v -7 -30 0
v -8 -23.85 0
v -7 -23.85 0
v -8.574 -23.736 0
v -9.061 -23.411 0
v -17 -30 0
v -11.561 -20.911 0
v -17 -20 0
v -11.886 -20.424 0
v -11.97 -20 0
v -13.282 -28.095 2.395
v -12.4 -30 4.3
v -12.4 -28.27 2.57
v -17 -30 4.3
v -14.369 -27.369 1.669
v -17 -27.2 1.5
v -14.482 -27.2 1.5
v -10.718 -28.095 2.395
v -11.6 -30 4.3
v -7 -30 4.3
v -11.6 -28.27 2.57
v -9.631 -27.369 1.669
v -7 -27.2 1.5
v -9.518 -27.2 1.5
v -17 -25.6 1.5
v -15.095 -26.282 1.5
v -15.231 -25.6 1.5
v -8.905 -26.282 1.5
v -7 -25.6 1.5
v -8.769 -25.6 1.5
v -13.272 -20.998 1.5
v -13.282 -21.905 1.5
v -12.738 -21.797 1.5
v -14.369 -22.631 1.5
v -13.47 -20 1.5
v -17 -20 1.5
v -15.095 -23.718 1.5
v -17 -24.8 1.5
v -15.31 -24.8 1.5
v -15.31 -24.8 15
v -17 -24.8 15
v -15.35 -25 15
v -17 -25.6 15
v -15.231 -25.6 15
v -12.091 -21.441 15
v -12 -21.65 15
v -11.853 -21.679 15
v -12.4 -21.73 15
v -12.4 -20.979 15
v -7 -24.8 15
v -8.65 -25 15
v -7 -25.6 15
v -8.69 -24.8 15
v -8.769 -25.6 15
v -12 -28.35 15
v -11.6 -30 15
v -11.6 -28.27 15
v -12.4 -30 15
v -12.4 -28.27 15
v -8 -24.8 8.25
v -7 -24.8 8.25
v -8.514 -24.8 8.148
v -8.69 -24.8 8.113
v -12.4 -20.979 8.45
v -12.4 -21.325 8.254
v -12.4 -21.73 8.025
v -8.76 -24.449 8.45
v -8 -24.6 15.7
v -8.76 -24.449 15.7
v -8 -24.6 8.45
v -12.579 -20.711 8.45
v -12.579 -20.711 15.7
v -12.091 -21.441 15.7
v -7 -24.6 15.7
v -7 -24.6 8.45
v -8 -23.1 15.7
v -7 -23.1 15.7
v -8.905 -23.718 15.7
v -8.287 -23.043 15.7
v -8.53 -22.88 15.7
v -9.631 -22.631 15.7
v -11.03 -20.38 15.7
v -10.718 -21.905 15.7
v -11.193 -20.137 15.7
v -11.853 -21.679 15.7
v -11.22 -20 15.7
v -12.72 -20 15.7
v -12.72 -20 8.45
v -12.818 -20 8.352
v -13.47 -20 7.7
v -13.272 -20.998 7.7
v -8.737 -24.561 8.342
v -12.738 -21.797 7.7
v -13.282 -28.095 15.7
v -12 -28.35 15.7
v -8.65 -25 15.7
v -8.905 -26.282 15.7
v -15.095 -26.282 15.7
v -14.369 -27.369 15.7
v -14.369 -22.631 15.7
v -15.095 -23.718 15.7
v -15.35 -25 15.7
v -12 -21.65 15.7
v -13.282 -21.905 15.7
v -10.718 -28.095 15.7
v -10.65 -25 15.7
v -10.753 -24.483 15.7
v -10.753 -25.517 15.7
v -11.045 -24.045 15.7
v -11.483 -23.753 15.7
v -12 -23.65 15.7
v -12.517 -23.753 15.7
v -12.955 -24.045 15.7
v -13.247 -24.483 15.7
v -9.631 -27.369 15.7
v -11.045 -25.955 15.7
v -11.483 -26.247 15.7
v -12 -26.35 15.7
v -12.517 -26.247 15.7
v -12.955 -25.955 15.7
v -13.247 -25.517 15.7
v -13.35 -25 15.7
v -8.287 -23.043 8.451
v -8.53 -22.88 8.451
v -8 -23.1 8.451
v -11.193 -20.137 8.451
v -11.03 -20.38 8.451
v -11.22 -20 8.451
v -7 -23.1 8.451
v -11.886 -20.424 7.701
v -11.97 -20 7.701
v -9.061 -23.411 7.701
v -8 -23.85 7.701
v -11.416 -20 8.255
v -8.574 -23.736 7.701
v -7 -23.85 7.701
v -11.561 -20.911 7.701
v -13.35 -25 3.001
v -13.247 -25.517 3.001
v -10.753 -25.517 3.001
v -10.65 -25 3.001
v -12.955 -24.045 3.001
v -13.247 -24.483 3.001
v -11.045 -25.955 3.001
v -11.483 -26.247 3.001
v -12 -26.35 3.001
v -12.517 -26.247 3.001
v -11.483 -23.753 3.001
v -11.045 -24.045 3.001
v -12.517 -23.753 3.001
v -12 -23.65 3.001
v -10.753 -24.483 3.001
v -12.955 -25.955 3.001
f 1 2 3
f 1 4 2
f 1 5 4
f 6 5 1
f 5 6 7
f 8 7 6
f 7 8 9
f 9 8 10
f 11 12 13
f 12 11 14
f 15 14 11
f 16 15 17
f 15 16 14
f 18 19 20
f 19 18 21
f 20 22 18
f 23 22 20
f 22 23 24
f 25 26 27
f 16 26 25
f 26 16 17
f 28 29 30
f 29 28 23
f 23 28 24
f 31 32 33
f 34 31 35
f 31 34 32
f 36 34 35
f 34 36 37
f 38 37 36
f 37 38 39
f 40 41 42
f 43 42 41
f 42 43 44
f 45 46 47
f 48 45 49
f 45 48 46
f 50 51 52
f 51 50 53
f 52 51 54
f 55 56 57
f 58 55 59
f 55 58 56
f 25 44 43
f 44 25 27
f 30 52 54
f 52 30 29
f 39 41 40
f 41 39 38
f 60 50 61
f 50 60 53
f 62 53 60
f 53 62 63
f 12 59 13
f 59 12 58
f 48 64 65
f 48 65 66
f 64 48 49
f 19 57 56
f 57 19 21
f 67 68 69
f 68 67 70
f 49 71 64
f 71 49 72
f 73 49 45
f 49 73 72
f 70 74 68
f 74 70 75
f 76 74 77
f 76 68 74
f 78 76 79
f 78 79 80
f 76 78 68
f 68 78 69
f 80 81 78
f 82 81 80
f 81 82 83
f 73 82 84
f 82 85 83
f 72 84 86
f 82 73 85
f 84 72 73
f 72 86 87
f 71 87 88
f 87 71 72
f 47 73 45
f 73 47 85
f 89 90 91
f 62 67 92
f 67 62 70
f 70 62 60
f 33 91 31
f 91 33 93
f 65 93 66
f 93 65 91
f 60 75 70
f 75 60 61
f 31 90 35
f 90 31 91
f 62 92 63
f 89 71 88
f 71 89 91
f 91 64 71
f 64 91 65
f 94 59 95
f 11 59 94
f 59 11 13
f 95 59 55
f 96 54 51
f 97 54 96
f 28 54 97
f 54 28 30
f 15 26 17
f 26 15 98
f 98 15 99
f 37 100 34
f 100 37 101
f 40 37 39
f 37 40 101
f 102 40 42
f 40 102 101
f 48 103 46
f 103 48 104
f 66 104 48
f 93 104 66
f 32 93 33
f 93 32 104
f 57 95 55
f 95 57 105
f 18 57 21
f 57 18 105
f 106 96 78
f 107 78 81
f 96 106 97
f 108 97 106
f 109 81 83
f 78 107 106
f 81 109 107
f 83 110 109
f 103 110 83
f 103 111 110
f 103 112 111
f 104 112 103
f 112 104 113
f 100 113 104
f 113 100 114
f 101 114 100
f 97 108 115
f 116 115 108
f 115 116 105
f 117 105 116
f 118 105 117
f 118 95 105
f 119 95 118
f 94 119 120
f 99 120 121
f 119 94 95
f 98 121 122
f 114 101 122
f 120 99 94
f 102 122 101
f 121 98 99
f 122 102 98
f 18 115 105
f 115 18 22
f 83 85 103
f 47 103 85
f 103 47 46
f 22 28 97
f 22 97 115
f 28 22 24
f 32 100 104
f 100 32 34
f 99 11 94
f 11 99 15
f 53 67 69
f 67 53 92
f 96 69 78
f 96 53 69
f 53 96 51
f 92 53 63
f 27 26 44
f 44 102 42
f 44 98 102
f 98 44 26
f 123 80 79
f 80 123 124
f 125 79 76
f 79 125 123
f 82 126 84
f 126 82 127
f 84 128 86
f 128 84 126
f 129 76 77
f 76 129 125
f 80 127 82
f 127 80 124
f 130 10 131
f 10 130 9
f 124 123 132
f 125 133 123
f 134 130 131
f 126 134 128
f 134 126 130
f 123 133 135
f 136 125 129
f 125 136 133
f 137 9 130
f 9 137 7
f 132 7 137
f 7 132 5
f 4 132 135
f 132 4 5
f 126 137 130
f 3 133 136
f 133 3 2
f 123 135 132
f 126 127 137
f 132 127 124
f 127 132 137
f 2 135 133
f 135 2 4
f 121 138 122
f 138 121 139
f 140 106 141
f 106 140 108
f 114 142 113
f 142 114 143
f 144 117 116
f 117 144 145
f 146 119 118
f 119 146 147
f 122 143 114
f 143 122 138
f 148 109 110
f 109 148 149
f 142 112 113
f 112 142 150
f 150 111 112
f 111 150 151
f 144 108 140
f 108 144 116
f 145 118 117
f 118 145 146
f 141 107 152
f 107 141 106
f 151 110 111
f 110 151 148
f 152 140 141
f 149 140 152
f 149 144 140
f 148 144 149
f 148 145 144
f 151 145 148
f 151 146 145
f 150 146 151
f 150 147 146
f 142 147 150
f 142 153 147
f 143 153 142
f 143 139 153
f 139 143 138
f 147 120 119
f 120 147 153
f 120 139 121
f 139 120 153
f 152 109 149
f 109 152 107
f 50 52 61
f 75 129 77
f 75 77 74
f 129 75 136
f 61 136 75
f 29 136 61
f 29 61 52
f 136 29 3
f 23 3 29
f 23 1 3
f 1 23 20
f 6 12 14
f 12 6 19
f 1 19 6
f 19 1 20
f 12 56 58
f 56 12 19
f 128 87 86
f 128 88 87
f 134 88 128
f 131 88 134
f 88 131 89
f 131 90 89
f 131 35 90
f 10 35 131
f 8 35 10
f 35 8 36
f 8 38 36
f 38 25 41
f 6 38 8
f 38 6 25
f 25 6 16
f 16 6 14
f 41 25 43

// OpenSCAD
// file: params.scad
depth=40;

xt60_loc = [ [-47,-depth, 15], [-27,-depth, 15], [-7,-depth, 15] ];
plug_loc = [5,-depth, 1.5];

margin = 0.2;

plug_margin=0.2;

xt60_margin = 0.25;
xt60m_margin = 1;

xt60_thickness = 1.5;
plug_thickness = 2;

case_w_inner = 115+2*margin;
case_h_inner = 30+2*margin;
case_thickness = 3;
case_front_thickness = 1.5;
case_w = case_w_inner + 2*case_thickness;
case_d = depth + 40;
case_h = case_h_inner + 2*case_thickness;

case_dim = [case_w, case_d, case_h];
case_dim_inner = [case_w_inner, case_d, case_h_inner];
case_dim_inside = [(case_w_inner+case_w)/2, case_d, (case_h_inner+case_h)/2];

bump_corner=(case_thickness+margin)*2.5;

front = [0,-1, 0];
bottom_front = [0,-1,-1];

grid_rows = 3;
grid_cols = 11;
grid_pitch = 10;
grid_thickness = .8;
grid_depth=12;
grid_xoff =-2;

screw_thread=3;
screw_hole_r=(screw_thread*.9)/2;
screw_hole_border=2;

mw_lrs_gap_d = 18.5;
// file: xt.scad
e=.001;
$fn=16;

xt60_w=15.7;
xt60_h=8;
xt60f_d = 15.7;
xt60f_base_d = 8;
xt60_combined_d=24.1;
xt60_pitch=7;
xt60_chamfer=2.5;
xt60f_pin_d=5.7;
xt60m_pin_d=4.7;
xt60_pin_w=4.5;
xt60_hole_w=4.5;
xt60_corner=.5;

module xt_pins(width, height, pitch)
{
	for (p=[-pitch/2, pitch/2])
	translate([p,0,0])
	cylinder(h=height, r=width/2);
}

module xt_base(w, h, d, chamfer, corner, margin=0, e=0)
{
	w = w-2*corner;
	h = h-2*corner;
	r = corner+margin;
	translate([0,0,-e])
    linear_extrude(d+2*e)
	hull()
    for (p=[ [w/2,-h/2],
	         [-w/2+chamfer, -h/2],
	         [-w/2, -h/2+chamfer],
	         [-w/2, h/2-chamfer],
	         [-w/2+chamfer, h/2],
	         [w/2, h/2]
	])
	translate(p)
	circle(r);
}

module xt60_combined_shell_cutout(margin=0,f_margin=-1,m_margin=-1, e=0)
{
	b=1; 
	xt_base(xt60_w, xt60_h, xt60_combined_d, xt60_chamfer, xt60_corner, margin, e);
	if (f_margin > margin)
	hull()
	{
		xt_base(xt60_w, xt60_h, xt60f_base_d, xt60_chamfer, xt60_corner, f_margin, e);
		translate([0,0,xt60f_base_d])
		xt_base(xt60_w, xt60_h, f_margin-margin, xt60_chamfer, xt60_corner, margin, e);
	}
	if (m_margin > margin)
	hull()
	{
		translate([0,0,xt60f_base_d-(m_margin-margin)])
		xt_base(xt60_w, xt60_h, m_margin-margin, xt60_chamfer, xt60_corner, margin, e);
		translate([0,0,xt60f_base_d])
		xt_base(xt60_w, xt60_h, xt60_combined_d-xt60f_base_d, xt60_chamfer, xt60_corner, m_margin, e);
	}
}


module xt60_combined_cutout(margin=0,f_margin=-1,m_margin=-1, e=0)
{
	b=1; 
	xt60_combined_shell_cutout(margin,f_margin,m_margin, e);

	translate([0, 0, -xt60f_pin_d-margin])
	xt_pins(xt60_pin_w+margin*2, xt60f_pin_d+b+margin, xt60_pitch);

	translate([0, 0, xt60_combined_d-b])
	xt_pins(xt60_pin_w+margin*2, xt60m_pin_d+b+margin, xt60_pitch);
}

module xt60f_cutout(margin=0,f_margin=-1,m_margin=-1,e=0)
{
	translate([0,0,-xt60f_d])
	xt60_combined_cutout(margin,f_margin,m_margin,e);
}

module xt60f_shell_cutout(margin=0,f_margin=-1,m_margin=-1,e=0)
{
	translate([0,0,-xt60f_d])
	xt60_combined_shell_cutout(margin,f_margin,m_margin,e);
}

module xt60f()
{
	b=1;
	translate([0,0,-xt60f_d])
	{
		xt_base(xt60_w, xt60_h, xt60f_base_d, xt60_chamfer, xt60_corner, 0, e);

		translate([0,0,b])
		difference()
		{
			xt_base(xt60_w-2*xt60_corner, xt60_h-2*xt60_corner, xt60f_d-b, xt60_chamfer, xt60_corner, 0, e);
			xt_pins(xt60_hole_w, xt60f_d, xt60_pitch);

		}

		difference()
		{
			translate([0, 0, -xt60f_pin_d])
			xt_pins(xt60_pin_w, xt60f_pin_d+b, xt60_pitch);

			translate([0, 0, -xt60f_pin_d-b])
			xt_pins(xt60_pin_w*.8, xt60f_pin_d+b, xt60_pitch);
		}
	}
}

xt60f();
%xt60f_cutout(margin=.4,m_margin=1,e=e);
// file: power_shield.scad
use <utils.scad>
use <grid.scad>

use <mw_lrs.scad>
use <powerplug.scad>
use <xt.scad>

$fn=16;
e=.001;


margin=.15;
shield_thickness=1.;
shield_bottom=.6;

border_w=51;
border_h=31.2;
border_d=3.5;

w=47;
h=26.8;
d=22;
chamf=4;

corner=1;

module plug_keepout(margin=0, depth=39, e=0)
{
	$fn=16;

	d = .1+e;
	border_w = border_w-2*corner;
	border_h = border_h-2*corner;
	w = w-2*corner;
	h = h-2*corner;
	r = corner+margin;
	off = 16.5;

	color([.3,.3,.3])
	translate([corner,depth-.1,corner])
	rotate([90,0,0])
	{
		translate([(border_w-w)/2,0,-d])
		linear_extrude(d+e)
		hull()
		for (p=[ [off, 0],
		         [off, h],
		         [w-chamf, h],
		         [w, h-chamf],
		         [w, chamf],
		         [w- chamf, 0],
		])
		translate(p)
		circle(r);
	}
}

module plug_hull(margin, d, e=0)
{
	hull()
	{
		difference()
		{
		plug(margin=margin, extra_depth=5+shield_bottom);
		translate([-10,-10,-10])
		cube([100, 30, 100]);
		}
		plug_keepout(margin=margin, depth=d, e=0);
	}
	plug_keepout(margin=margin, depth=d, e=e);
	
}

inner_w=.8;

module power_shield()
{
color("red")
	union()
	{
	difference()
	{
		union()
		{
			plug_hull(margin=margin+shield_thickness, d=39);
		}
		union()
		{
		plug_hull(margin=margin, d=38, e=2);
		}
	}

	intersection()
	{
		plug_hull(margin=margin+shield_thickness/2, d=38.5, e=2);
		difference()
		{
			union()
			{
				translate([(border_w-w)/2+8.5-inner_w/2, 22, h/2-4-inner_w/2])
				cube([inner_w, 20, 20]);

				translate([(border_w-w)/2+8.5, 22, h/2-4-inner_w/2])
				cube([9., 17, inner_w]);

				translate([(border_w-w)/2+17.5-inner_w/2, 22, h/2-4-inner_w/2])
				cube([inner_w, 17, 10]);

				translate([(border_w-w)/2+15-inner_w/2, 38.4, h/2-4-inner_w/2])
				cube([2.5, shield_bottom, 10]);

				for (y=[0,h])
				for (x=[0,w-2])
				translate([(border_w-w)/2+x-5/sqrt(2)-inner_w/2, 22, y])
				rotate([0,45,0])
				cube([5,1,5]);

			}
			translate([(border_w-w)/2+6.5-inner_w/2, 21, h/2-6/2-inner_w/2])
			cube([5, 2, 5.5]);
		}
	}
}
}

rotate([-90,0,0])
translate([0,-39,0])
{
	power_shield();

	//preview()
	//plug();
}
// file: powerplug.scad
e=0.001;

border_w=51;
border_h=31.2;
border_d=3.5;

w=47;
h=26.8;
d=22;
chamf=4;

corner=1;

module plug(margin=0, extra_depth=0)
{
	$fn=16;

	d = d+extra_depth;
	border_w = border_w-2*corner;
	border_h = border_h-2*corner;
	w = w-2*corner;
	h = h-2*corner;
	r = corner+margin;

	color([.3,.3,.3])
	translate([corner,0,corner])
	rotate([90,0,0])
	{
		translate([0,(h-border_h)/2,0])
		linear_extrude(border_d+margin)
		hull()
		for(p=[ [0, 0],
		        [0, border_h],
		        [border_w, border_h],
		        [border_w, 0]
		])
		translate(p)
		circle(r);

		translate([(border_w-w)/2,0,-d])
		linear_extrude(d+e)
		hull()
		for (p=[ [0, 0],
		         [0, h],
		         [w-chamf, h],
		         [w, h-chamf],
		         [w, chamf],
		         [w- chamf, 0],
		])
		translate(p)
		circle(r);
	}
}

module plug_latch(margin=0)
{
	rotate([90,0,0])
	rotate([0,90,0])
	linear_extrude(9)
	{
		polygon([ [0, -1], [0, 1+margin], [9, margin]]);
	}
}

module plug_latches(margin=0)
{
	for (x=[9.5,32])
	for (y_flip=[-1, 1])
	translate([(border_w-w)/2+x,1.6, h/2])
	scale([1,1,y_flip])
	translate([0,0,h/2])
	plug_latch(margin);
}


module plug_latches_keepout(margin=0, extra_depth=0)
{
	for (x=[9.5,32])
	for (y_flip=[-1, 1])
	translate([(border_w-w)/2+x,1.6, h/2])
	scale([1,1,y_flip])
	translate([0,0,h/2])
	cube([9,d+extra_depth-1.6+e,1+margin]);
}

plug();

plug_latches();

#plug_latches_keepout();

%plug(margin=.3);
// file: mw_lrs.scad
e=.001;
$fn=16;

mw_lrs_w=115;
mw_lrs_h=30;
mw_lrs_d=215;


mw_lrs_holes_pitch_d  = 150;
mw_lrs_holes_pitch_w  = 50;
mw_lrs_holes_height_h = 12.5;

mw_lrs_gap_h = 23;
mw_lrs_gap_d = 18.5;

mw_lrs_case_thickness = 1.6;

m4_thread = 4;

mw_lrs_screw_terminal_x=8.5;
mw_lrs_screw_terminal_w=88;
mw_lrs_screw_terminal_d=15;
mw_lrs_screw_terminal_h=15;
mw_lrs_screw_terminal_pitch = 9.5;
mw_lrs_screw_terminal_gap_w = 8;
mw_lrs_screw_terminal_gap_d = 14;
mw_lrs_screw_terminal_gap_z = 7;
mw_lrs_screw_terminal_gap_h = 6;

module mw_lrs_side_holes()
{
	translate( [0, 0, mw_lrs_holes_height_h] )
	for( r = [ 0, 180 ] )
	rotate( [0, r, 0] )
	for( y = [ (mw_lrs_d-mw_lrs_holes_pitch_d)/2, (mw_lrs_d+mw_lrs_holes_pitch_d)/2 ] )
	translate( [-mw_lrs_w/2, y, 0] )
	rotate( [0, 90, 0] )
	children();
}

module mw_lrs_bottom_holes()
{
	for( x = [ -mw_lrs_holes_pitch_w/2, mw_lrs_holes_pitch_w/2 ] )
	for( y = [ (mw_lrs_d-mw_lrs_holes_pitch_d)/2, (mw_lrs_d+mw_lrs_holes_pitch_d)/2 ] )
	translate( [x, y, 0] )
	children();
}

module mw_lrs_holes()
{
	mw_lrs_side_holes() children();
	mw_lrs_bottom_holes() children();
}

module mw_lrs_screw_terminal()
{
	colors = [
		"red", "red", "red",
		"black", "black", "black",
		"green", "blue", "brown",
	];
	b=1;
	translate([mw_lrs_screw_terminal_x, mw_lrs_case_thickness, mw_lrs_h-mw_lrs_gap_h-e])
	{
		difference()
		{
			translate([-mw_lrs_screw_terminal_w/2, 0, 0])
			cube([mw_lrs_screw_terminal_w, mw_lrs_screw_terminal_d, mw_lrs_screw_terminal_h+e]);
			for (i=[0:8])
			translate([(i-4)*9.5-mw_lrs_screw_terminal_gap_w/2, -b, mw_lrs_screw_terminal_gap_z])
			cube([mw_lrs_screw_terminal_gap_w, mw_lrs_screw_terminal_gap_d+b, mw_lrs_screw_terminal_gap_h]);
		}

		for (i=[0:8])
		translate([(i-4)*9.5-mw_lrs_screw_terminal_gap_w/2, -0, mw_lrs_screw_terminal_h])
		color(colors[i])
		cube([mw_lrs_screw_terminal_gap_w,mw_lrs_screw_terminal_gap_d,.1]);

	}
}

module mw_lrs_vents()
{
	b=1;
	hole=4;
	for (y = [36, 44, 52])
	for (i = [-1, 1])
	hull()
	{
		translate([i*(19/2+hole/2), y, mw_lrs_h-mw_lrs_case_thickness-b])
			cylinder(mw_lrs_case_thickness+2*b, r=hole/2);

		translate([i*(19/2+hole/2+33), y, mw_lrs_h-mw_lrs_case_thickness-b])
			cylinder(mw_lrs_case_thickness+2*b, r=hole/2);
	}

	translate([-mw_lrs_w/2+36.7, mw_lrs_d-47.45,mw_lrs_h-mw_lrs_case_thickness-b])
		cylinder(mw_lrs_case_thickness+2*b, r=50/2);
}

module mw_lrs_vents_keepout(h, margin=0)
{
	b=1;
	hole=4;
	hull()
	for (y = [36, 44, 52])
	for (i = [-1, 1])
	{
		translate([i*(19/2+hole/2), y, mw_lrs_h-b])
			cylinder(h+b, r=hole/2+margin);

		translate([i*(19/2+hole/2+33), y, mw_lrs_h-b])
			cylinder(h+b, r=hole/2+margin);
	}

	translate([-mw_lrs_w/2+36.7, mw_lrs_d-47.45,mw_lrs_h-b])
		cylinder(h+b, r=50/2);
}

module mw_lrs()
{
	b=1; 

	union()
	{
		color([.75,.75,.75])
		difference()
		{

			translate([-mw_lrs_w/2,0,0])
			cube([mw_lrs_w, mw_lrs_d, mw_lrs_h]);

			union()
			{
				translate([-mw_lrs_w/2+mw_lrs_case_thickness, -b, mw_lrs_h-mw_lrs_gap_h] )
				cube( [ mw_lrs_w-2*mw_lrs_case_thickness, b+mw_lrs_gap_d, mw_lrs_gap_h+b] );

				translate([-mw_lrs_w/2+mw_lrs_case_thickness, mw_lrs_gap_d-e, mw_lrs_h-mw_lrs_gap_h] )
				cube( [ mw_lrs_w-2*mw_lrs_case_thickness, mw_lrs_d-mw_lrs_gap_d+e-mw_lrs_case_thickness, mw_lrs_gap_h-mw_lrs_case_thickness] );

				mw_lrs_vents();

				mw_lrs_holes()
				{
					translate([0,0,-e])
					cylinder(h=5+e, r=m4_thread/2);
				}
			}
		}
		color([.1, .3, .1])
		translate([-mw_lrs_w/2+mw_lrs_case_thickness, 0, mw_lrs_h-mw_lrs_gap_h-e])
		cube([mw_lrs_w-2*mw_lrs_case_thickness, mw_lrs_d-mw_lrs_case_thickness, e+.1]);
		mw_lrs_screw_terminal();
	}
}

module mw_lrs_keepout(margin=0, e=0)
{
	b=1; 

	w=mw_lrs_w+margin*2;
	d=mw_lrs_d+margin*2;
	h=mw_lrs_h+margin*2;

	translate([-w/2,-margin,-margin])
	cube([w, d, h]);
}

mw_lrs();
%mw_lrs_keepout(margin=.4);

module m4_hole(h, margin=0)
{
	translate([0,0,-h])
	cylinder(h=h+e, r=(m4_thread+margin)/2);
}

%mw_lrs_holes()
m4_hole(10);
// file: grid.scad
module bars(width, height, n, pitch, bar_width, off)
{
	for (i=[0:n-1])
		translate([0, (i-(n-1)/2)*pitch-bar_width/2+off, 0])
			cube([width, bar_width, height]);
}

module grid(width, depth, height, n_rows, n_cols, pitch=10, x_pitch=-1, y_pitch=-1, bar_width=1, x_bar_width=-1, y_bar_width=-1, x_off=0, y_off=0)
{
	x_pitch = x_pitch > 0 ? x_pitch : pitch;
	y_pitch = y_pitch > 0 ? y_pitch : pitch;
	x_bar_width = x_bar_width > 0 ? x_bar_width : bar_width;
	y_bar_width = y_bar_width > 0 ? y_bar_width : bar_width;

	translate( [0, depth/2, 0] )
		bars( width, height, n_rows, y_pitch, y_bar_width, y_off );
	translate( [width/2, 0, 0] )
		rotate([0,0,90])
			bars( depth, height, n_cols, x_pitch, x_bar_width, -x_off) ;
}

grid(100, 50, 1, 4, 8);
// file: utils.scad
module xz_toward_y()
{
	scale([1, 1, -1])
	rotate([-90,0,0])
	children();
}

module anchor(dim, anchor=[0,0,0])
{
	translate([-(1+anchor.x)*dim.x/2, -(1+anchor.y)*dim.y/2, -(1+anchor.z)*dim.z/2])
	children();
}

module block(dim, anchor=[0,0,0])
{
	anchor(dim, anchor)
	cube(dim);
}

module rounded_block_y(dim, anchor=[0,0,0], r=0)
{
	anchor(dim, anchor)
	xz_toward_y()
	linear_extrude(dim.y)
	hull()
	for (p=[ [r,r], [dim.x-r, r], [dim.x-r, dim.z-r], [r, dim.z-r] ] )
	translate(p)
	circle(r);
}

module chamfer_block_y(dim, anchor=[0,0,0], r=0)
{
	anchor(dim, anchor)
	hull()
	{
		translate([r,0,0])
		cube([dim.x-r*2, dim.y, dim.z]);

		translate([0,0,r])
		cube([dim.x, dim.y, dim.z-r*2]);
	}
}

module chamfer_block(dim, anchor=[0,0,0], r=0)
{
	anchor(dim, anchor)
	hull()
	{
		translate([r,r,0])
		cube([dim.x-r*2, dim.y-r*2, dim.z]);

		translate([r,0,r])
		cube([dim.x-r*2, dim.y, dim.z-r*2]);

		translate([0,r,r])
		cube([dim.x, dim.y-r*2, dim.z-r*2]);
	}
}

module preview()
{
	if ($preview)
	children();
}
// file: cover.scad
use <utils.scad>
use <grid.scad>

use <mw_lrs.scad>
use <powerplug.scad>
use <power_shield.scad>
use <xt.scad>

include <params.scad>

$fn=16;
e=.001;

module cutout()
{
	mw_lrs_keepout(margin=margin);

	for ( p = xt60_loc )
	translate(p)
	translate([0,0,0])
	rotate([90,90,0])
	xt60f_cutout(margin=xt60_margin,m_margin=xt60m_margin,e=e);

	translate(plug_loc)
	{
	plug(margin=plug_margin, , extra_depth=-2);
	plug_latches_keepout(margin=plug_margin);
	}

	mw_lrs_holes()
	m4_hole(10, margin=.25);

	mw_lrs_vents_keepout(h=10, margin=1);
}

module shell()
{
	difference()
	{
		translate([0, -depth, -case_thickness-margin])
		rounded_block_y(case_dim, bottom_front, r=case_thickness);

		translate([0, -depth+case_front_thickness, -margin])
		chamfer_block([case_w_inner, case_d, case_h_inner], bottom_front, r=case_thickness);
	}
}

module round_corner(w)
{
	difference()
	{
		rotate([90,0,0])
		cylinder(w, r1=w, r2=0);
		union()
		{
			translate([-w-e,-w,-w])
			cube([w,w*2,w*2]);

			translate([-w,-w,-w-e])
			cube([w*2,w*2,w]);
		}
	}
}


module bump_corner(w)
{
	round_corner(w, $fn=4);
}

module front_grid()
{
	translate([0, -depth+e,-case_thickness/2])
	xz_toward_y()
	anchor(case_dim_inside, bottom_front)
	grid(case_dim_inside.x, case_dim_inside.z, case_thickness+grid_depth-e, grid_rows, grid_cols, pitch=grid_pitch, bar_width=grid_thickness, x_off=grid_xoff, y_off=0);
}

module at_panel_screws()
{
	for (x=[ -12, -42 ])
	for (z=[ 5, 25 ])
	translate([x,-depth, z])
	children();
}


module cover()
{
	difference()
	{
		union()
		{
			shell();
	
			intersection()
			{
				union()
				{
					front_grid();
					translate(plug_loc)
					plug(margin=plug_margin+plug_thickness, extra_depth=-2);
	
					for ( p = xt60_loc )
					translate(p)
					rotate([90,90,0])
					xt60f_shell_cutout(margin=  xt60_margin+xt60_thickness,
					                 m_margin=xt60m_margin+xt60_thickness);

					at_panel_screws()
					translate([0,-e, 0])
					xz_toward_y()
					linear_extrude(15.7+e)
					circle(screw_hole_r+screw_hole_border);

				}
				translate([0, -depth+e, case_h_inner/2])
				block(case_dim_inside, front);
			}

			translate([0,-margin,case_h_inner/2-margin])
			for (x=[1, -1])
			for (z=[1, -1])
			scale([x, 1, z])
			translate([-case_w_inner/2, 0,-case_h_inner/2])
			bump_corner(bump_corner);
		}
		union()
		{
			cutout();

			at_panel_screws()
			translate([0,case_thickness+e, 0])
			xz_toward_y()
			linear_extrude(15.7)
			circle(screw_hole_r);
		}
	}
}


module print_orientation()
{
	rotate([90,0,0])
	translate([0,depth,0])
	children();
}


print_orientation()
preview()
{
	mw_lrs();

	for ( p = xt60_loc )
	translate(p)
	rotate([90,90,0])
	xt60f();

	translate(plug_loc)
	plug();

	translate(plug_loc)
	power_shield();
}

print_orientation()
#cover();
// main file
use <cover.scad>

print_orientation()
color("red")
intersection()
{
	translate([-17.,-40,20])
	cube([10, 30, 10]);
	cover();
}
